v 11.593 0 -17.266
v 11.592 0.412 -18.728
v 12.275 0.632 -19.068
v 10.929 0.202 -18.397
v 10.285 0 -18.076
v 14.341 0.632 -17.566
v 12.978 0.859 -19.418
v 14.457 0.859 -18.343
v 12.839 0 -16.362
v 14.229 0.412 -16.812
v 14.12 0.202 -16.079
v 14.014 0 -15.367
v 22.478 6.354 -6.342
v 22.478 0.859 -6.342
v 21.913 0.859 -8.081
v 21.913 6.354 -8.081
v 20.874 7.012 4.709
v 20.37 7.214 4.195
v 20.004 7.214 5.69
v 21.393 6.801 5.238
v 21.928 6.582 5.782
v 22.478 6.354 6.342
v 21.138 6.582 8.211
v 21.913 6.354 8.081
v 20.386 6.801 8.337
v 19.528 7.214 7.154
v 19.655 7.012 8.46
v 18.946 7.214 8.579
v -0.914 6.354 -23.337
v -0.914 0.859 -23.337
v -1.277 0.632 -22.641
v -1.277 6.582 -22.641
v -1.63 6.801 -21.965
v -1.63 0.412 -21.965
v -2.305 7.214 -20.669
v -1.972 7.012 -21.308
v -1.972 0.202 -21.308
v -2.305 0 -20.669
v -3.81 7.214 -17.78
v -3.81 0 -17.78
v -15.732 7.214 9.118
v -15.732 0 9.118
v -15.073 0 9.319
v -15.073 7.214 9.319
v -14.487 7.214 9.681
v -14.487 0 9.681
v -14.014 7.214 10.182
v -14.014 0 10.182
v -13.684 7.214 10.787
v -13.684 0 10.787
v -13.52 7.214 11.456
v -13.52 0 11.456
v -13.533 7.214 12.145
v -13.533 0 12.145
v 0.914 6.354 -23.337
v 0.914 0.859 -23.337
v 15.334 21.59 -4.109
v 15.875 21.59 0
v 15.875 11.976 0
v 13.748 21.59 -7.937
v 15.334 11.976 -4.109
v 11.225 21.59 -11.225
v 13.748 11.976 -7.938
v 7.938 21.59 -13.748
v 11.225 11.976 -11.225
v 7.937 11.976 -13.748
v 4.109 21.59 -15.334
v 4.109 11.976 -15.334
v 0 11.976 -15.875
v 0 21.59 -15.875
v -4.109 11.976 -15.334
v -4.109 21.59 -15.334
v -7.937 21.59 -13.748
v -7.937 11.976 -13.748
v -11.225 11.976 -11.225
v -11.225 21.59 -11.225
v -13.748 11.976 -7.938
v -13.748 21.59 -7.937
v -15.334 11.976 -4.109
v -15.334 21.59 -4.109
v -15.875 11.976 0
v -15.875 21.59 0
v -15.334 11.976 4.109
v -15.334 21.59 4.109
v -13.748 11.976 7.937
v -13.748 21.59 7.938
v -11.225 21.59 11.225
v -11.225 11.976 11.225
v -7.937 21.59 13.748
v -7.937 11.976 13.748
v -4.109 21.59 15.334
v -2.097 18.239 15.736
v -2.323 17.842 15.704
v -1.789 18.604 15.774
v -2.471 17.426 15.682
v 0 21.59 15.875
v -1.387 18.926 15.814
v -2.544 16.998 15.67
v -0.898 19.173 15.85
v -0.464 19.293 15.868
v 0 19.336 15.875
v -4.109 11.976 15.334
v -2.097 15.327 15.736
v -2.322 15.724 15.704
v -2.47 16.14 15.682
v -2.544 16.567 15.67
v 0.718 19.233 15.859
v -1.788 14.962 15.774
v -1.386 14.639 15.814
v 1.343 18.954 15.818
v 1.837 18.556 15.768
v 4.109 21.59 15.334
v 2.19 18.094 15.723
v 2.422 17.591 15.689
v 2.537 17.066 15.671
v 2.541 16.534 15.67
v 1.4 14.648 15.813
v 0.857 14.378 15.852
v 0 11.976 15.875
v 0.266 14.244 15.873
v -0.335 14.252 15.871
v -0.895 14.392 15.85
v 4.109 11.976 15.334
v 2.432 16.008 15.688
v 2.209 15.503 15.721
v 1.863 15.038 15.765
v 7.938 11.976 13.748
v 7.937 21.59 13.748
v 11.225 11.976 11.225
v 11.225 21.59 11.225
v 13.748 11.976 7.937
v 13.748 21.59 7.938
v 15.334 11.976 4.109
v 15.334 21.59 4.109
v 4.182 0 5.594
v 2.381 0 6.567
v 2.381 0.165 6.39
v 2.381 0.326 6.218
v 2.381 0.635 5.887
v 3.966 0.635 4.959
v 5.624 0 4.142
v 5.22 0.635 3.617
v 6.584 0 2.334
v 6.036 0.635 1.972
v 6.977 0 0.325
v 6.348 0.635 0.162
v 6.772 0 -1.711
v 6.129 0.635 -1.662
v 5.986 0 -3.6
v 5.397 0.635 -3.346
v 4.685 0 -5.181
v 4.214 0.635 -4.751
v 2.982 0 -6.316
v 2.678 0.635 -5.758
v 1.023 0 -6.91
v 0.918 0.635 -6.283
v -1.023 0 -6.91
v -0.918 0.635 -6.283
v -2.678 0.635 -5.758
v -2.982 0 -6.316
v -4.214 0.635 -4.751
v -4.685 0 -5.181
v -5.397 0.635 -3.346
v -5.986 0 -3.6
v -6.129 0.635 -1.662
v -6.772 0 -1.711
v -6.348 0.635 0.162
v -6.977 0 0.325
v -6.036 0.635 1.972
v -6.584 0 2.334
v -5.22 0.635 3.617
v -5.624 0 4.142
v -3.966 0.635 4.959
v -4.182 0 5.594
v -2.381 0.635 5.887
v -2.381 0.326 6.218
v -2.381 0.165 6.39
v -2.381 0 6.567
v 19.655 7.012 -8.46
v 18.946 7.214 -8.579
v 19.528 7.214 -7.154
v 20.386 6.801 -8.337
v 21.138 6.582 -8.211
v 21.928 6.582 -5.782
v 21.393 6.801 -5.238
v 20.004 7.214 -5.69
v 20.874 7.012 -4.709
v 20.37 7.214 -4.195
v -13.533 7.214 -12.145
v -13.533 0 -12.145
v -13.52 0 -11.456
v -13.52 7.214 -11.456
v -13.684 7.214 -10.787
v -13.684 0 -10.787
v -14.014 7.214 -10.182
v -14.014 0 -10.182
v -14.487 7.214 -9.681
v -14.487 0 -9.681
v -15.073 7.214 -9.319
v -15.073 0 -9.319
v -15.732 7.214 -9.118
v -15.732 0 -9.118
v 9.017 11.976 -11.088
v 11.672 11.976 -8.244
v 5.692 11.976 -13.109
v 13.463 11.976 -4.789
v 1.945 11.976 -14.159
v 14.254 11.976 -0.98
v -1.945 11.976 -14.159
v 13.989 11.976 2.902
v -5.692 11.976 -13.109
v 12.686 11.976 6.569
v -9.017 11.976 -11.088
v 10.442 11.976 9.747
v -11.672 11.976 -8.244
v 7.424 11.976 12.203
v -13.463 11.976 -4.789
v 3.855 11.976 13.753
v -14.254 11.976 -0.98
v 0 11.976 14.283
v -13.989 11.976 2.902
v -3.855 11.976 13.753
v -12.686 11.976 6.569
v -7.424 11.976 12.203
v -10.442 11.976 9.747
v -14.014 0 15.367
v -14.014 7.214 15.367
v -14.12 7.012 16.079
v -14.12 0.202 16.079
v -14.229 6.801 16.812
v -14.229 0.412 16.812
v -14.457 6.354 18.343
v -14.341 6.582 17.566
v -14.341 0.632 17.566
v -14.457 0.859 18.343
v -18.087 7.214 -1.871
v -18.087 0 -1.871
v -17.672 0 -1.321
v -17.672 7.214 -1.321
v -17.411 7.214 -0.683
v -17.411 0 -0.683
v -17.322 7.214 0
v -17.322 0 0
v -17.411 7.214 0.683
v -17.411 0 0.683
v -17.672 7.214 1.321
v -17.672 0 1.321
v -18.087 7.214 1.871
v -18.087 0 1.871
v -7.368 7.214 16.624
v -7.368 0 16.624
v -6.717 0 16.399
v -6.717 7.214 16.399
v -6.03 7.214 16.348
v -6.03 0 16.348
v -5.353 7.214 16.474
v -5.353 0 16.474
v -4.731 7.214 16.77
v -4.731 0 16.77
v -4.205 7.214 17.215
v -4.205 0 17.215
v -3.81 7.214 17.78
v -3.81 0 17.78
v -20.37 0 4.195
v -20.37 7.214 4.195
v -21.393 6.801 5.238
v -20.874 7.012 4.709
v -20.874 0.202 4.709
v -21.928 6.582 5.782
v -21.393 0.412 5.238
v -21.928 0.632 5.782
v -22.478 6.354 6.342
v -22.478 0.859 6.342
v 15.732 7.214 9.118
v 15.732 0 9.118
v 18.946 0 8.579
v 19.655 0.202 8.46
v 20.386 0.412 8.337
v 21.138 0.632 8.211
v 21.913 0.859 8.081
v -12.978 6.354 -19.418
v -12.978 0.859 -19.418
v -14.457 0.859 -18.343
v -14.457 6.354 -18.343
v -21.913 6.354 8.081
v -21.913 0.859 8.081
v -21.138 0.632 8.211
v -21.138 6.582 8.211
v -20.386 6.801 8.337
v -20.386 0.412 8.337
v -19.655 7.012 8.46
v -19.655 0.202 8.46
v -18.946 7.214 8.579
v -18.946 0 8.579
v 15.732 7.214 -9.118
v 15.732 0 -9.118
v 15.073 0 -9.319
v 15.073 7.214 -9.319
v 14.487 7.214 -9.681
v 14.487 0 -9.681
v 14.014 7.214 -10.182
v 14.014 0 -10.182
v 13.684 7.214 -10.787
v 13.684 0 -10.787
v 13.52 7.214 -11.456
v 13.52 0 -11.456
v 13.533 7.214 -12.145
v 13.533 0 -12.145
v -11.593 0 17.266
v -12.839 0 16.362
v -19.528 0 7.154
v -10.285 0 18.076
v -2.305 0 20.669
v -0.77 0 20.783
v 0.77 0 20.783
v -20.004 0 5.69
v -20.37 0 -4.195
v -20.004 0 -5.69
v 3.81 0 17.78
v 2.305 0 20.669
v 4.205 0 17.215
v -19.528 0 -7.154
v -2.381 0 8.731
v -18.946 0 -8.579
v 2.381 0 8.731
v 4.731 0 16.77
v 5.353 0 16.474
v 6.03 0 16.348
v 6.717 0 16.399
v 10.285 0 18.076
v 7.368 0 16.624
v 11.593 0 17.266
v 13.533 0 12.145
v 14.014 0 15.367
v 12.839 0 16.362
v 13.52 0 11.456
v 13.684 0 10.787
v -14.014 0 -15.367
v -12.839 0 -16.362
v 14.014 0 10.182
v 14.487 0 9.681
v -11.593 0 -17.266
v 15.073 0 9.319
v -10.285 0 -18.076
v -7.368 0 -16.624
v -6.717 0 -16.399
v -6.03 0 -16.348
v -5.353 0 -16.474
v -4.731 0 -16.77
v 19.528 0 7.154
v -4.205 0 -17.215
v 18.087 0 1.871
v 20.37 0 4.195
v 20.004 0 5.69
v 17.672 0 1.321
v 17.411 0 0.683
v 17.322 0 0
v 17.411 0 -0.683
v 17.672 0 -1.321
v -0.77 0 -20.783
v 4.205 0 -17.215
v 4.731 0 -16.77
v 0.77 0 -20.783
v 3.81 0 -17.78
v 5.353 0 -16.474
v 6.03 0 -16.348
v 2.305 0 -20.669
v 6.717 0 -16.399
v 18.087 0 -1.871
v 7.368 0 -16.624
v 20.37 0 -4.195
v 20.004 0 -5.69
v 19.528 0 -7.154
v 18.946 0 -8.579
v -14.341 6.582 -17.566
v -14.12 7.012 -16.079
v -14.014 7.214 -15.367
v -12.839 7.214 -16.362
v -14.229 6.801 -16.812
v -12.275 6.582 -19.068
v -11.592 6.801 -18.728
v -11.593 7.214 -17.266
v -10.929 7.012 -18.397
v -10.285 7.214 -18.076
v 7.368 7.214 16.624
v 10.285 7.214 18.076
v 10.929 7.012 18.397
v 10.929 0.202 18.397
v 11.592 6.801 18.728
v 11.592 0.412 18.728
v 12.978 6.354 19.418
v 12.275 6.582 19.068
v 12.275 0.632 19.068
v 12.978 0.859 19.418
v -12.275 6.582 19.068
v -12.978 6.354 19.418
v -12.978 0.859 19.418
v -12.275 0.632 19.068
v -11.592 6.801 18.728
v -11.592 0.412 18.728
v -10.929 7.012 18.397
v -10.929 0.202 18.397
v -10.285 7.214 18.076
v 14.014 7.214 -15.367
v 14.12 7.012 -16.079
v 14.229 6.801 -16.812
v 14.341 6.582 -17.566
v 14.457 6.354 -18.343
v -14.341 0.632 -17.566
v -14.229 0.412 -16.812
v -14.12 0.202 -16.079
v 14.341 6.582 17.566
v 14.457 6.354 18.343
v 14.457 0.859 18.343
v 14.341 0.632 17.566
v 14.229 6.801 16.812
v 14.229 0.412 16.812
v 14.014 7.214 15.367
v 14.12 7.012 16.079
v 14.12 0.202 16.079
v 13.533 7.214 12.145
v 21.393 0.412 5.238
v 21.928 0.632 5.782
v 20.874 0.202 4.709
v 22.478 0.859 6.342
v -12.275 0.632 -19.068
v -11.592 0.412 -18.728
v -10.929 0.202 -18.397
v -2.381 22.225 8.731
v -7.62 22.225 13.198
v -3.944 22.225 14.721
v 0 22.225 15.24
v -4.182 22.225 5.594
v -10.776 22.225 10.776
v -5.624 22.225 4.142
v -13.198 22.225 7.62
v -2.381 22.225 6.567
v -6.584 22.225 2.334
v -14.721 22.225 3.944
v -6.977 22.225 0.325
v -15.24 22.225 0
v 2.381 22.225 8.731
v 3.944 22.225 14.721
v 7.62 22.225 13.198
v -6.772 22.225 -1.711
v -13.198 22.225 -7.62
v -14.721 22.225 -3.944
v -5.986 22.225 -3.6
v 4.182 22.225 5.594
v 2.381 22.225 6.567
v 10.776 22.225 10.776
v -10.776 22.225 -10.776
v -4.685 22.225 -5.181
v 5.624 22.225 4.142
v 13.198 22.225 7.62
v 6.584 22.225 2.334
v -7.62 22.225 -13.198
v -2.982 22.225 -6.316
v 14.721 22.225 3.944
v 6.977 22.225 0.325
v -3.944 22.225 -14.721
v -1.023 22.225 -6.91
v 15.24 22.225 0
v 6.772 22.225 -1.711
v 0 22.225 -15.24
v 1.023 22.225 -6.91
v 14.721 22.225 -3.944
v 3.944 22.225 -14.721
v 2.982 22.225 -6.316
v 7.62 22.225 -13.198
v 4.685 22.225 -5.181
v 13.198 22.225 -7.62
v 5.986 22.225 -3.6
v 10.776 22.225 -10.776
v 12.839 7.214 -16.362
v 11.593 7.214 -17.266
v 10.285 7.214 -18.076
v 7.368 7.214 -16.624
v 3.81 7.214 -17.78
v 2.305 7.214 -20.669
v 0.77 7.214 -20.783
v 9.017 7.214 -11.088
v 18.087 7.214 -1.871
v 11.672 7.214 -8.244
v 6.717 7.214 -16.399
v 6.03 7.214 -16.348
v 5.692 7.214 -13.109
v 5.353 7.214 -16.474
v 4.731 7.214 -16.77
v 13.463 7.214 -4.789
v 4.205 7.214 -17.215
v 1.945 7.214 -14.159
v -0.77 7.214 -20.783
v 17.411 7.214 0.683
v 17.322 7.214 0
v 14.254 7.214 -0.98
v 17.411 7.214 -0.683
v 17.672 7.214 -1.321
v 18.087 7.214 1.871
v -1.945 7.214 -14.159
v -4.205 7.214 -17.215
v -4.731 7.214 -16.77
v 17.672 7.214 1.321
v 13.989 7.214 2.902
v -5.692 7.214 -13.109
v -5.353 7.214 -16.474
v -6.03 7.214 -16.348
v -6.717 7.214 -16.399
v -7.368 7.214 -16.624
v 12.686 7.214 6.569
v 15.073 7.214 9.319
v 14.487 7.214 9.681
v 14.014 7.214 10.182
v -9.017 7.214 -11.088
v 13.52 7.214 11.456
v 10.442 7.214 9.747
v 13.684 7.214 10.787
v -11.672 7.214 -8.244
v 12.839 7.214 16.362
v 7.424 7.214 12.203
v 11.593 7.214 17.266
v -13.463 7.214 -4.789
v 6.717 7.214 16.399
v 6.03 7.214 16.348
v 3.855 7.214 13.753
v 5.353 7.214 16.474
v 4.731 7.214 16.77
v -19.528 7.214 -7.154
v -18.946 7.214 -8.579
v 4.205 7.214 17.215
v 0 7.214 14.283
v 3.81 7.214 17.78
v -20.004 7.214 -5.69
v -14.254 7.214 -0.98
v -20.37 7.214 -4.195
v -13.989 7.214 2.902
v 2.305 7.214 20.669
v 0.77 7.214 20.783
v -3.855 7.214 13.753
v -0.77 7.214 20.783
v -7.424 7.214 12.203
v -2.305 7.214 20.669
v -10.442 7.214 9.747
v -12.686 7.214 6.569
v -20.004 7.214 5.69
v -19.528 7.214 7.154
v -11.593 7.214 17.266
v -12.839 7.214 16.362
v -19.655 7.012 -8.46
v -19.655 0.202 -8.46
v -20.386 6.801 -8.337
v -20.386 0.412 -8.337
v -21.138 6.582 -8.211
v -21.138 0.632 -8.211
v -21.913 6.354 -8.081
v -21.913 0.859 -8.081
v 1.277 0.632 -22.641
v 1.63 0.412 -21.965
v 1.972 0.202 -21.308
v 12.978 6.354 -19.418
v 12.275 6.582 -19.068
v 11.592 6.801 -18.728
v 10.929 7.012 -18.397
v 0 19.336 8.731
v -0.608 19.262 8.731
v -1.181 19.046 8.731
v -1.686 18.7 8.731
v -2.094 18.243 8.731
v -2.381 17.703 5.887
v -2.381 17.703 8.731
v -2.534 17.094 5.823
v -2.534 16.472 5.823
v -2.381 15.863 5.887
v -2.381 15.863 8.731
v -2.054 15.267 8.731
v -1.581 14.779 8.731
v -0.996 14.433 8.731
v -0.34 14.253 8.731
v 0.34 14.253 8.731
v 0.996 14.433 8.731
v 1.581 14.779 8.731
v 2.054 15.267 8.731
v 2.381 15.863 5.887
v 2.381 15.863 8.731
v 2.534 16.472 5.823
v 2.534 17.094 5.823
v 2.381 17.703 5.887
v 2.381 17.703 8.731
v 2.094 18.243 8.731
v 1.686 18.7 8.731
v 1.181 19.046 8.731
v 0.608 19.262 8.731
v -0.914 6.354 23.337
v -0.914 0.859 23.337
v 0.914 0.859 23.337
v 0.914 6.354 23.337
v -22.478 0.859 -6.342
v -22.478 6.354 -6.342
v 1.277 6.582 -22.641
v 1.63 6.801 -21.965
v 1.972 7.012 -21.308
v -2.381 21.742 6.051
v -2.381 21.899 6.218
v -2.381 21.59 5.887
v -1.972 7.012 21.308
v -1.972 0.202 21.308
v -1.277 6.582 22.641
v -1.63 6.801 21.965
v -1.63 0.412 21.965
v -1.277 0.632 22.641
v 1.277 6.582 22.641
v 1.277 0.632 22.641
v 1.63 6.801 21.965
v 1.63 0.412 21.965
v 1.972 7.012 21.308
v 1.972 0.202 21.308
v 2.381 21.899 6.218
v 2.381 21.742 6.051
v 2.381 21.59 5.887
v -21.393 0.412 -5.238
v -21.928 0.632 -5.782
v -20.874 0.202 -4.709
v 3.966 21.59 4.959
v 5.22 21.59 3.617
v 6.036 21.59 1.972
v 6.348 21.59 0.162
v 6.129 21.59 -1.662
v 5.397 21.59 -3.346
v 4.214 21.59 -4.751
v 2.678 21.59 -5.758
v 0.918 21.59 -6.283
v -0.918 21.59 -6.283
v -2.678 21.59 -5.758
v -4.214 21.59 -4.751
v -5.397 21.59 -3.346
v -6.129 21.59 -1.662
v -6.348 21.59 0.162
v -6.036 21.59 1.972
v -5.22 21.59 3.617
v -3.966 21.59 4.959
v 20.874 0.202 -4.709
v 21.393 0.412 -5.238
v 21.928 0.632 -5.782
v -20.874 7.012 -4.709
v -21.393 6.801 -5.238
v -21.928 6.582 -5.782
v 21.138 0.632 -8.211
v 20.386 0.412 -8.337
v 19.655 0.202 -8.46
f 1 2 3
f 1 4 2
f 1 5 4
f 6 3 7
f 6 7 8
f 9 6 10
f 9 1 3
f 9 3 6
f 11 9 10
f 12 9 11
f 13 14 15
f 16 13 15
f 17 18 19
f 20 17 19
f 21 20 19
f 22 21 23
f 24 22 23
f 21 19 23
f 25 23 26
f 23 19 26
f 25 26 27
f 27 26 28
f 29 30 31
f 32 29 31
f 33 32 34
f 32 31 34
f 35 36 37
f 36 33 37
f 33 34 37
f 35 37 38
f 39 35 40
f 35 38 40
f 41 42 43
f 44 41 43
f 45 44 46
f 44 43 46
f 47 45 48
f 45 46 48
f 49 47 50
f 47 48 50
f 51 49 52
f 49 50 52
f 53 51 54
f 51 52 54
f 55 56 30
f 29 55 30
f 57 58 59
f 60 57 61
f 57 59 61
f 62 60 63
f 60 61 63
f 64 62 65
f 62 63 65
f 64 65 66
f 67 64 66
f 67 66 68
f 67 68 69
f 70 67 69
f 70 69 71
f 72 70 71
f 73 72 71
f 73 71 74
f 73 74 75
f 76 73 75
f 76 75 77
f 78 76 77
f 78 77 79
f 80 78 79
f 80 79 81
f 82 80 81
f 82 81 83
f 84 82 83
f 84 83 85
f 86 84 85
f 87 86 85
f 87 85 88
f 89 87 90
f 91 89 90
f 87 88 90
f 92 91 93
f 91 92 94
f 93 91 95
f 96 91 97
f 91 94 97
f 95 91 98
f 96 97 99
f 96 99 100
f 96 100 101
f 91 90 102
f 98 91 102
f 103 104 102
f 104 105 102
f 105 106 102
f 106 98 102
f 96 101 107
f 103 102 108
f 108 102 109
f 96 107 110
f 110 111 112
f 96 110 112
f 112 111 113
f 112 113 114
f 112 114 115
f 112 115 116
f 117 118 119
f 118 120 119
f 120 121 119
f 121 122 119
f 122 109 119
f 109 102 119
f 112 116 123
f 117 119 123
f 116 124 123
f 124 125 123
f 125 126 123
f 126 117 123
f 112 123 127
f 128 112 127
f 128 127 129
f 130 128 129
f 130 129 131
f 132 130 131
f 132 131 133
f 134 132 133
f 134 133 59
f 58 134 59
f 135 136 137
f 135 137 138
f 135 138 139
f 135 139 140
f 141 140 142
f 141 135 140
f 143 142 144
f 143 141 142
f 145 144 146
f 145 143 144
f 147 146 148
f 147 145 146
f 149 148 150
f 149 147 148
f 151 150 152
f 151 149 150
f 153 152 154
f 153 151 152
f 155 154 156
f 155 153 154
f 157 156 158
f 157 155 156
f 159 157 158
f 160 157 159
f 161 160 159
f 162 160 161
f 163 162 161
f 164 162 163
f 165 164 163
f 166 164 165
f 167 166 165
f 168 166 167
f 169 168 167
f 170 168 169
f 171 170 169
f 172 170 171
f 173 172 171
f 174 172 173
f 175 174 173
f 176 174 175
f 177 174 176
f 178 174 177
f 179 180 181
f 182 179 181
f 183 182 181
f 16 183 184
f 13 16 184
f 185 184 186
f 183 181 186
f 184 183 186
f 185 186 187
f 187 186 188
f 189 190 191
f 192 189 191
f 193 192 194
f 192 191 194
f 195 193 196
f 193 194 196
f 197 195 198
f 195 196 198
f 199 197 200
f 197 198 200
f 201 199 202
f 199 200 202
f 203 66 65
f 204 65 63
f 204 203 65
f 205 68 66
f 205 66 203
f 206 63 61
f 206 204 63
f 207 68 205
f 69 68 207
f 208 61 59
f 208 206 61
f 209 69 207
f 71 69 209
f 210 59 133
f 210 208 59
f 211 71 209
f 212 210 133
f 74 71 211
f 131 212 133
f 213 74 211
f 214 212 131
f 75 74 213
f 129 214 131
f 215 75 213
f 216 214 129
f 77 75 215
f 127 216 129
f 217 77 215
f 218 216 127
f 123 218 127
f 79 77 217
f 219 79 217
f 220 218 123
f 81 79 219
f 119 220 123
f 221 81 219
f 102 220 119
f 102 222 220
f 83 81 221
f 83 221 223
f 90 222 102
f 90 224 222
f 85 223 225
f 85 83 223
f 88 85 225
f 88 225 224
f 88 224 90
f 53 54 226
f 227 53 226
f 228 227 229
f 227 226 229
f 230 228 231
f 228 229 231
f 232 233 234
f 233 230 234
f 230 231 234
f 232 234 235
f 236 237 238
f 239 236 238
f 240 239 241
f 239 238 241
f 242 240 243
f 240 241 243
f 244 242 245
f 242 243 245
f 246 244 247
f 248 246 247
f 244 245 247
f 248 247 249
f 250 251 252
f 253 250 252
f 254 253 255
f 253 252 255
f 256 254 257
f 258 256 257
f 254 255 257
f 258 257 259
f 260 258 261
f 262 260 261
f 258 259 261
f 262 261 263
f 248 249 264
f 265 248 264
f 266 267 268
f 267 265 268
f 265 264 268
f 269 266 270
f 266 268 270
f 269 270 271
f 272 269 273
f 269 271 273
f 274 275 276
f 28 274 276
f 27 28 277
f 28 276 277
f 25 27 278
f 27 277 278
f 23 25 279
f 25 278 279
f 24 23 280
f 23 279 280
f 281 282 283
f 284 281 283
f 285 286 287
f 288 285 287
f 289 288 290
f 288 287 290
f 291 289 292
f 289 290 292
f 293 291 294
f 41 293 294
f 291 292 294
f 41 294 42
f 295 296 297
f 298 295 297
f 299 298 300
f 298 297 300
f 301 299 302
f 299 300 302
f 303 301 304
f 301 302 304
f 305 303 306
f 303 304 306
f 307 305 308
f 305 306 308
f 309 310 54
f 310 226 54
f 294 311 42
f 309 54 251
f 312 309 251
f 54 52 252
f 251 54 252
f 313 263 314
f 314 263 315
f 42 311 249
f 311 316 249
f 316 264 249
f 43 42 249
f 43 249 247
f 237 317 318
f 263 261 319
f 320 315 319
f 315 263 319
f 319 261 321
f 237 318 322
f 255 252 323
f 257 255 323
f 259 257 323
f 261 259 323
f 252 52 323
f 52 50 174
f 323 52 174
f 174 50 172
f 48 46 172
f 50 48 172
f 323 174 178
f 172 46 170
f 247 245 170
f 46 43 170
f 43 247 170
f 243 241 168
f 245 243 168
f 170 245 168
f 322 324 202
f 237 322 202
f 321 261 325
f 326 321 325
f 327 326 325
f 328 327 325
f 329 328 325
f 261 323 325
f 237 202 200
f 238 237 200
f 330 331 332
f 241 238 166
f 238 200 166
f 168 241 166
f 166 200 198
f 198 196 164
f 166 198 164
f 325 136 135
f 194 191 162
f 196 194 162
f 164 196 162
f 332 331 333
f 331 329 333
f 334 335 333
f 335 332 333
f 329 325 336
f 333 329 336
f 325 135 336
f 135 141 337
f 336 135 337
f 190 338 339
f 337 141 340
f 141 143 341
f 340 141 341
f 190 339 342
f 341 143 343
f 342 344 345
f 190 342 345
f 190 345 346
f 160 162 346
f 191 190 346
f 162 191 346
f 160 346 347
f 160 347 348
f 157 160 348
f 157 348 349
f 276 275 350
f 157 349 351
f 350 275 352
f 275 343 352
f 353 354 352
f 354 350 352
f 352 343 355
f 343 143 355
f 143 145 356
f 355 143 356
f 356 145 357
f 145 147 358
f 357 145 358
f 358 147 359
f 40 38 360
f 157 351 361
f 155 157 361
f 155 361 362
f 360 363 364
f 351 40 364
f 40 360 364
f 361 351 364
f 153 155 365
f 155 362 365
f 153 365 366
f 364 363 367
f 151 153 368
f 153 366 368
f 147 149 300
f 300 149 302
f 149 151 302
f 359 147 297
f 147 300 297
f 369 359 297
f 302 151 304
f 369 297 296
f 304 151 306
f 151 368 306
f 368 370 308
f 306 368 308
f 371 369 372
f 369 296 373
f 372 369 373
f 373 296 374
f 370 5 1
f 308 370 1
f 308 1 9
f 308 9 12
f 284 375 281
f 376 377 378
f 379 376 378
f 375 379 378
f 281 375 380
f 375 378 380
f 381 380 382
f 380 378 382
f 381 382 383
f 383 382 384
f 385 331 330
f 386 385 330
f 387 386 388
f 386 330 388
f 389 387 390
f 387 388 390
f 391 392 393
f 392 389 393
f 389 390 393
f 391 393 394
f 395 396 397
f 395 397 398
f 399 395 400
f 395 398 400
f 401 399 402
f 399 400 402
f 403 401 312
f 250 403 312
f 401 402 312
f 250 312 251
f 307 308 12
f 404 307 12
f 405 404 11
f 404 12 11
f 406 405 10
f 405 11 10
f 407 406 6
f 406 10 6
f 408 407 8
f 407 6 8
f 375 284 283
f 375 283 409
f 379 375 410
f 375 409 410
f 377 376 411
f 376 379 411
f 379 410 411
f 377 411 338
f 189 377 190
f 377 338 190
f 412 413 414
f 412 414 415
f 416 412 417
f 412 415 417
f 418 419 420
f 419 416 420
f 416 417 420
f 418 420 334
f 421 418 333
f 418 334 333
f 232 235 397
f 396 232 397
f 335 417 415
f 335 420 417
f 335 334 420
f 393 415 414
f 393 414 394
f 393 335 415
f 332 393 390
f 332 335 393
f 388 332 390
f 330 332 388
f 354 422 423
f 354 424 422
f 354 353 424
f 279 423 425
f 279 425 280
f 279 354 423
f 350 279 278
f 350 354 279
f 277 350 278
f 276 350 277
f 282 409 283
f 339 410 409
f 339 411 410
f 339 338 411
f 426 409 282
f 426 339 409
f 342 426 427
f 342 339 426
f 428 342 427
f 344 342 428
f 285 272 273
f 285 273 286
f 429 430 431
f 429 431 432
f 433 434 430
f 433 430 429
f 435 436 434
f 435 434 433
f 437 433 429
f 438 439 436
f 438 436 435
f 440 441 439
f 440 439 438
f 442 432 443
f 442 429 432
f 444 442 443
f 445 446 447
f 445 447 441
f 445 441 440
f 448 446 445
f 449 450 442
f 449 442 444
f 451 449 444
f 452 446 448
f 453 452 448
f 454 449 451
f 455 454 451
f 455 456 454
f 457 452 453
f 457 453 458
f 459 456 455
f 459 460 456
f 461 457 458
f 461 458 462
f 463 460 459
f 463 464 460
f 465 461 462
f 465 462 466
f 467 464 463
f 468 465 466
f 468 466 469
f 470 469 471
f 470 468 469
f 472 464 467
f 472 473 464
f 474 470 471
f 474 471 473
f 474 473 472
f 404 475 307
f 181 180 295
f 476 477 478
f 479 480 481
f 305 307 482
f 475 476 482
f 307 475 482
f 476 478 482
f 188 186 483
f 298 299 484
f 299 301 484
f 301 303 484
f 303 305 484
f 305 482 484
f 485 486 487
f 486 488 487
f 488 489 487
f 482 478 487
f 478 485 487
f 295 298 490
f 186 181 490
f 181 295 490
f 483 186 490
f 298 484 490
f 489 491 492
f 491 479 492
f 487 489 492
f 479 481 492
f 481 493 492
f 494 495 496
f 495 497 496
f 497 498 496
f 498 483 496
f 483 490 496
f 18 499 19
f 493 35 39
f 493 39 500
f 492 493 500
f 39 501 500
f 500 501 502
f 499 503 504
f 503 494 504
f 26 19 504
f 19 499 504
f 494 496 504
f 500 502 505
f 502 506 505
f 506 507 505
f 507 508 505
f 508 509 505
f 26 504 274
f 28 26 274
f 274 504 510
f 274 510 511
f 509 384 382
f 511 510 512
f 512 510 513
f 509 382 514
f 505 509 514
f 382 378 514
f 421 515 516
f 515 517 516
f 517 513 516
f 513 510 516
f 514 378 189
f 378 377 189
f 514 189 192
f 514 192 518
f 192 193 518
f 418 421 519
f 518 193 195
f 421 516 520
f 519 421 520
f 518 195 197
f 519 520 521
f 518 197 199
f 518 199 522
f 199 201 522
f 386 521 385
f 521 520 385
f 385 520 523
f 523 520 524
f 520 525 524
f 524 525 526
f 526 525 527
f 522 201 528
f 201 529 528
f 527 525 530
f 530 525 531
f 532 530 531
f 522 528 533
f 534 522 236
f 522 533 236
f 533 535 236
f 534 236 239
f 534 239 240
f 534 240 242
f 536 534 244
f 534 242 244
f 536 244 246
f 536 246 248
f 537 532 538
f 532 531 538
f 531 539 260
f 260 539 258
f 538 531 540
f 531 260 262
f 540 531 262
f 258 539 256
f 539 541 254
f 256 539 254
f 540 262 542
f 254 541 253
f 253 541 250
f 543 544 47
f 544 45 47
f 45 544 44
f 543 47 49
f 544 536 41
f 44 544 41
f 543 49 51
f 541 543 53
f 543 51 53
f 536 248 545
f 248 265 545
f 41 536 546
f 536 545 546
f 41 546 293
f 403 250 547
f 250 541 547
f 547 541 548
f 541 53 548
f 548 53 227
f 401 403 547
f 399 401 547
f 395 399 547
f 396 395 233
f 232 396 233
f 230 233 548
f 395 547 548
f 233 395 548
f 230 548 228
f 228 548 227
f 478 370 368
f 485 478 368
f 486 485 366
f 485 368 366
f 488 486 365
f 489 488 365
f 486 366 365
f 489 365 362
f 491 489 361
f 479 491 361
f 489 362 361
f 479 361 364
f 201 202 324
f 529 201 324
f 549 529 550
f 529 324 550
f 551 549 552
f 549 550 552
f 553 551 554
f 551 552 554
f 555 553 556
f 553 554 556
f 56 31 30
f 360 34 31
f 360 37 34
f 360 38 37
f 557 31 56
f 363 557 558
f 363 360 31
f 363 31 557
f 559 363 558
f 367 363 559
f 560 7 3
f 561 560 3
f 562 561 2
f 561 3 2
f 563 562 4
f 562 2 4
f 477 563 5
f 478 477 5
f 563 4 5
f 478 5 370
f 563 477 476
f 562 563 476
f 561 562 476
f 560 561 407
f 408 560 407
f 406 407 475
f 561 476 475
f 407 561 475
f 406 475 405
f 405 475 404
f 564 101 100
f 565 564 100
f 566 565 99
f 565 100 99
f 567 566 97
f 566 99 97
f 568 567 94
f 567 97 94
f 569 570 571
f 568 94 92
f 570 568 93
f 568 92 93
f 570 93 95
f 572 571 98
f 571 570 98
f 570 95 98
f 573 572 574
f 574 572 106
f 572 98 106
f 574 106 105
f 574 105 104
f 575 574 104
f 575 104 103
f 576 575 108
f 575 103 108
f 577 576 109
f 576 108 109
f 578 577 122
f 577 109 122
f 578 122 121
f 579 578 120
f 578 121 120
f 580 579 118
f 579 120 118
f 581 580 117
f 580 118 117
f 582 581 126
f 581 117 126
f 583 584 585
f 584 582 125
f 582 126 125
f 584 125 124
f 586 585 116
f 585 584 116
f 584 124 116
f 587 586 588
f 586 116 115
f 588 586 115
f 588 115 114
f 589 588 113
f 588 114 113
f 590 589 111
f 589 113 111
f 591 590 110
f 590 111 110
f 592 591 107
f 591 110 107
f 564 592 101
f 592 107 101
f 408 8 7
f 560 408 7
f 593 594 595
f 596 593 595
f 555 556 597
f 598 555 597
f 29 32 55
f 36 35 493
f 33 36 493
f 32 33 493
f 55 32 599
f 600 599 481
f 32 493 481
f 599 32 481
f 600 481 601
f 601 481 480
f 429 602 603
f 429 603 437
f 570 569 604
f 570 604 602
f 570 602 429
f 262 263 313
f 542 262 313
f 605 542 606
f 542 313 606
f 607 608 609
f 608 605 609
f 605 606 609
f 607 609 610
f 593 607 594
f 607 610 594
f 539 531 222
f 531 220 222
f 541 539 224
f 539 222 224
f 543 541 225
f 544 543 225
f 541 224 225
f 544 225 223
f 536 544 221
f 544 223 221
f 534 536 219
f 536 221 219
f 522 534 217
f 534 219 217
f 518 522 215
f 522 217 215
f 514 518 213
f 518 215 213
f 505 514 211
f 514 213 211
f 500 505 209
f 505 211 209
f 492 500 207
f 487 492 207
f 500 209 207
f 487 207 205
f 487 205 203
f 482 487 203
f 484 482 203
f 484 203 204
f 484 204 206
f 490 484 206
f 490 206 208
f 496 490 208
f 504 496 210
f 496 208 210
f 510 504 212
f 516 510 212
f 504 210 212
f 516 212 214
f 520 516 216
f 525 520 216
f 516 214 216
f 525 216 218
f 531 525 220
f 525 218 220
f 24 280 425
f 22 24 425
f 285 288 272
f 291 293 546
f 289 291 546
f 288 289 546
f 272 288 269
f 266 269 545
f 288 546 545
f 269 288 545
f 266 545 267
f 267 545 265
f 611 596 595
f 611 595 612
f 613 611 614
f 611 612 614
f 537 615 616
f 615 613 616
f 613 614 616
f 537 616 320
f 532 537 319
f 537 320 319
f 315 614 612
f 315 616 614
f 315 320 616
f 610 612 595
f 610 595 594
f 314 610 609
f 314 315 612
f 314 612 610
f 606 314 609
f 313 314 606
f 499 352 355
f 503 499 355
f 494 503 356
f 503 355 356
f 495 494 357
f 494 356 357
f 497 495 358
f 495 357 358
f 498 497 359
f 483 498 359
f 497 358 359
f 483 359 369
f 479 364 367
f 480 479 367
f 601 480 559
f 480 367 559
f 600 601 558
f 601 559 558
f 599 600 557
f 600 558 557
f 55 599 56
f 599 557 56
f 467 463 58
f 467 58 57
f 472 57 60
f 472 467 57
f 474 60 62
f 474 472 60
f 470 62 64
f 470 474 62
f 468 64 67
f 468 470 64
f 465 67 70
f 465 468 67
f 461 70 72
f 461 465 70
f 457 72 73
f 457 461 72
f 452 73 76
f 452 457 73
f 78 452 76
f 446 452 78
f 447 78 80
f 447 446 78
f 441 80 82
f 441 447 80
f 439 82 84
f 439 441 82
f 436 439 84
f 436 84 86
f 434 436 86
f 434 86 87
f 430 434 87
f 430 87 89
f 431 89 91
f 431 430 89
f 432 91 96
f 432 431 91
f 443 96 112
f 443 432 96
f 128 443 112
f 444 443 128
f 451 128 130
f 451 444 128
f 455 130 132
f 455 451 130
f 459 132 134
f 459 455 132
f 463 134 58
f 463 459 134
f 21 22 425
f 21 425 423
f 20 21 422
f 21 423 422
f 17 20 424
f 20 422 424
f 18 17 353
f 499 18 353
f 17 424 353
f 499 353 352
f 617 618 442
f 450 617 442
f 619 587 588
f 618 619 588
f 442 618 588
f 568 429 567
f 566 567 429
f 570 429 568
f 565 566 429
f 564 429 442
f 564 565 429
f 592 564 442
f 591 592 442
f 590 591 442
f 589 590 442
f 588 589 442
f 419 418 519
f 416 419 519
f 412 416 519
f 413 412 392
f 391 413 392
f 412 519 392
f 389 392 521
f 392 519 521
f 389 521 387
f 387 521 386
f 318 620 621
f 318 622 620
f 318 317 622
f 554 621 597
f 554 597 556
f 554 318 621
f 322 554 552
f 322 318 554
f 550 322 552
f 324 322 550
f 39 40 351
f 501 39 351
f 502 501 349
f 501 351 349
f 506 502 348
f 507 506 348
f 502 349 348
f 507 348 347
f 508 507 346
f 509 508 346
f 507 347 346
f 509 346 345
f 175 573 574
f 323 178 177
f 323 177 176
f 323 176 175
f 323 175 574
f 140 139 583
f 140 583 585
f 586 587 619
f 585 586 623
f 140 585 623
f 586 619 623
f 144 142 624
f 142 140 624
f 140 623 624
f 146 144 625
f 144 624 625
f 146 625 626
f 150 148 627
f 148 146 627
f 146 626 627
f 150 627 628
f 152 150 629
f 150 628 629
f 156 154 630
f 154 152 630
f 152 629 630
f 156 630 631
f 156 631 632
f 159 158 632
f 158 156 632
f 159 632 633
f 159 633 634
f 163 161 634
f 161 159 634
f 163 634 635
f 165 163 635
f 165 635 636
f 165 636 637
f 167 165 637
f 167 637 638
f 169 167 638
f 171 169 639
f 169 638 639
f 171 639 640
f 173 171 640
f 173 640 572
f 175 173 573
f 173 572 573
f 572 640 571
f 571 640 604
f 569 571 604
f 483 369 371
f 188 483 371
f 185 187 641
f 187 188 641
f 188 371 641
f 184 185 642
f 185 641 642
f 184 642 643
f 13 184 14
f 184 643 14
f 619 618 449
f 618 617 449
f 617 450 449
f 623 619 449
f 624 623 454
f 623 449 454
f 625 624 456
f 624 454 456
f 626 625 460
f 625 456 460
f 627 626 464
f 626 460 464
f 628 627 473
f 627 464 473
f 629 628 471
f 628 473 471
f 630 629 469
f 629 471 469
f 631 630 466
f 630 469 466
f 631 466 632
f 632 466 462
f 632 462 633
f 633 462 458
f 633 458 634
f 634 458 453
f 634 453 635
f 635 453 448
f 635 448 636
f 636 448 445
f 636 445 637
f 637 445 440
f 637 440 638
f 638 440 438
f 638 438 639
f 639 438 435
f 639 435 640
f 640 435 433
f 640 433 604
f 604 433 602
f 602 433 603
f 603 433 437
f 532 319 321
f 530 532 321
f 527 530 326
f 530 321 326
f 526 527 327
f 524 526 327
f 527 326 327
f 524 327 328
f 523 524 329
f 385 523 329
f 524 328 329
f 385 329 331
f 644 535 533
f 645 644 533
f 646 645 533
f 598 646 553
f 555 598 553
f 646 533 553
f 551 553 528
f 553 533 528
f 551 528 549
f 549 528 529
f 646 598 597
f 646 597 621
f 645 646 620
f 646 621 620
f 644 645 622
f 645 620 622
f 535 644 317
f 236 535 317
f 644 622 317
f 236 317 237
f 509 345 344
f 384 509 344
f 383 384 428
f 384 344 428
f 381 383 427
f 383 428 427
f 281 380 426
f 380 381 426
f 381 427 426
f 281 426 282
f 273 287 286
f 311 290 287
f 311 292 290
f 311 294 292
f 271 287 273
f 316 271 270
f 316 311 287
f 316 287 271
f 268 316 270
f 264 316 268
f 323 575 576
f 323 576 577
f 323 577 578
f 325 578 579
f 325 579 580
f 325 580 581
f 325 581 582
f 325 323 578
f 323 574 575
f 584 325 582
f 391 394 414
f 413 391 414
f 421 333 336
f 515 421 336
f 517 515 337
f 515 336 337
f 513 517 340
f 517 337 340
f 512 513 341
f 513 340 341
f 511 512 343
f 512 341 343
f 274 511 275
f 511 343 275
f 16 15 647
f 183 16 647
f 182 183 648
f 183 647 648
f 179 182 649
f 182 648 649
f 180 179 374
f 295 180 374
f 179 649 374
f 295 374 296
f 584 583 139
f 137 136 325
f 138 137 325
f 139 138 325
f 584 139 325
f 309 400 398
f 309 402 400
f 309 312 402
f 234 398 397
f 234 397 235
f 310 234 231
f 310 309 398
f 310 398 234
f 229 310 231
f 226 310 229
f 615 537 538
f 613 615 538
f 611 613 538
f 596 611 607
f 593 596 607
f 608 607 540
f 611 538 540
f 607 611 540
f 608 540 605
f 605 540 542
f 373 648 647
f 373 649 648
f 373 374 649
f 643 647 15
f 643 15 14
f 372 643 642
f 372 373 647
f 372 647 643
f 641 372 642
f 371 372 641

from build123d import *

# Parameters (mm, degrees)
SALIENTE_EXTRUIR1_DEPTH = 7.2136
CROQUIS2_R              = 15.875
SALIENTE_EXTRUIR2_DEPTH = 15.0114
CROQUIS5_R              = 6.35
CORTAR_EXTRUIR2_DEPTH   = 23.2250001
CHAFL_N2_SIZE           = 0.635
REDONDEO1_R             = 0.635
CROQUIS8_W              = 3.175
CROQUIS8_H              = 4.7625
CROQUIS9_W              = 2.5527
CROQUIS9_H              = 15.875
CHAFL_N3_SIZE           = 0.635
CROQUIS11_W             = 4.7625
CROQUIS11_H             = 4.7625
CORTAR_EXTRUIR3_DEPTH   = 23.225


with BuildPart() as part:
    # Croquis1 → Saliente-Extruir1 (new body)
    with BuildSketch(Plane(origin=(0, 0, 0), x_dir=(1, 0, 0), z_dir=(0, 1, 0))):
        with BuildLine():
            Line((12.977610276, 19.417818353), (7.368467037, 16.623783971))
            ThreePointArc((7.368467037, 16.623783971), (5.352847667, 16.474371141), (3.81, 17.78))
            Line((3.81, 17.78), (0.9144, 23.337392972))
            ThreePointArc((0.9144, 23.337392972), (0, 23.3553), (-0.9144, 23.337392972))
            Line((-0.9144, 23.337392972), (-3.81, 17.78))
            ThreePointArc((-3.81, 17.78), (-5.352847667, 16.474371141), (-7.368467037, 16.623783971))
            Line((-7.368467037, 16.623783971), (-12.977610276, 19.417818353))
            ThreePointArc((-12.977610276, 19.417818353), (-13.727900903, 18.894834609), (-14.457140556, 18.342876684))
            Line((-14.457140556, 18.342876684), (-13.533176534, 12.144860349))
            ThreePointArc((-13.533176534, 12.144860349), (-14.013937128, 10.181721309), (-15.732430111, 9.117847487))
            Line((-15.732430111, 9.117847487), (-21.91261452, 8.081297111))
            ThreePointArc((-21.91261452, 8.081297111), (-22.212210255, 7.217184609), (-22.477744799, 6.342004954))
            Line((-22.477744799, 6.342004954), (-18.087139608, 1.870796833))
            ThreePointArc((-18.087139608, 1.870796833), (-17.322178923, 0), (-18.087139608, -1.870796833))
            Line((-18.087139608, -1.870796833), (-22.477744799, -6.342004954))
            ThreePointArc((-22.477744799, -6.342004954), (-22.212210255, -7.217184609), (-21.91261452, -8.081297111))
            Line((-21.91261452, -8.081297111), (-15.732430111, -9.117847487))
            ThreePointArc((-15.732430111, -9.117847487), (-14.013937128, -10.181721309), (-13.533176534, -12.144860349))
            Line((-13.533176534, -12.144860349), (-14.457140556, -18.342876684))
            ThreePointArc((-14.457140556, -18.342876684), (-13.727900903, -18.894834609), (-12.977610276, -19.417818353))
            Line((-12.977610276, -19.417818353), (-7.368467037, -16.623783971))
            ThreePointArc((-7.368467037, -16.623783971), (-5.352847667, -16.474371141), (-3.81, -17.78))
            Line((-3.81, -17.78), (-0.9144, -23.337392972))
            ThreePointArc((-0.9144, -23.337392972), (0, -23.3553), (0.9144, -23.337392972))
            Line((0.9144, -23.337392972), (3.81, -17.78))
            ThreePointArc((3.81, -17.78), (5.352847667, -16.474371141), (7.368467037, -16.623783971))
            Line((7.368467037, -16.623783971), (12.977610276, -19.417818353))
            ThreePointArc((12.977610276, -19.417818353), (13.727900903, -18.894834609), (14.457140556, -18.342876684))
            Line((14.457140556, -18.342876684), (13.533176534, -12.144860349))
            ThreePointArc((13.533176534, -12.144860349), (14.013937128, -10.181721309), (15.732430111, -9.117847487))
            Line((15.732430111, -9.117847487), (21.91261452, -8.081297111))
            ThreePointArc((21.91261452, -8.081297111), (22.212210255, -7.217184609), (22.477744799, -6.342004954))
            Line((22.477744799, -6.342004954), (18.087139608, -1.870796833))
            ThreePointArc((18.087139608, -1.870796833), (17.322178923, 0), (18.087139608, 1.870796833))
            Line((18.087139608, 1.870796833), (22.477744799, 6.342004954))
            ThreePointArc((22.477744799, 6.342004954), (22.212210255, 7.217184609), (21.91261452, 8.081297111))
            Line((21.91261452, 8.081297111), (15.732430111, 9.117847487))
            ThreePointArc((15.732430111, 9.117847487), (14.013937128, 10.181721309), (13.533176534, 12.144860349))
            Line((13.533176534, 12.144860349), (14.457140556, 18.342876684))
            ThreePointArc((14.457140556, 18.342876684), (13.727900903, 18.894834609), (12.977610276, 19.417818353))
        make_face()
    extrude(amount=SALIENTE_EXTRUIR1_DEPTH)

    # Croquis2 → Saliente-Extruir2 (add)
    with BuildSketch(Plane(origin=(0, 7.2136, 0), x_dir=(1, 0, 0), z_dir=(0, 1, 0))):
        Circle(CROQUIS2_R)
    extrude(amount=SALIENTE_EXTRUIR2_DEPTH)

    # Croquis3 → Cortar-Revolución3 (revolve, cut)
    with BuildSketch(Plane(origin=(0, 0, 0), x_dir=(0, 0, -1), z_dir=(1, 0, 0))):
        Polygon((23.972392972, 7.2136), (23.972392972, 6.1468), (20.797392972, 7.2136), align=None)
    cortar_revoluci_n3 = revolve(axis=Axis((0, 0, 0), (0, -1, 0)), mode=Mode.SUBTRACT)

    # Simetría1: Cortar-Revolución3 across plane
    add(cortar_revoluci_n3.mirror(Plane.ZX.offset(3.6068)), mode=Mode.SUBTRACT)

    # Croquis5 → Cortar-Extruir2 (cut, through all)
    with BuildSketch(Plane(origin=(0, 22.225, 0), x_dir=(1, 0, 0), z_dir=(0, 1, 0))):
        Circle(CROQUIS5_R)
    extrude(amount=-CORTAR_EXTRUIR2_DEPTH, mode=Mode.SUBTRACT)

    # Chaflán2
    chafl_n2_edges = [part.edges().sort_by_distance(p)[0] for p in [
        (-15.875, 22.225, 0),
    ]]
    chamfer(chafl_n2_edges, length=CHAFL_N2_SIZE)

    # Redondeo1
    redondeo1_edges = [part.edges().sort_by_distance(p)[0] for p in [
        (-15.875, 7.2136, 0),
    ]]
    fillet(redondeo1_edges, radius=REDONDEO1_R)

    # Croquis8 → Cortar-Revolución4 (revolve, cut)
    with BuildSketch(Plane(origin=(0, 0, 0), x_dir=(0, 0, -1), z_dir=(1, 0, 0))):
        with Locations((-15.870465895, 9.59485)):
            Rectangle(CROQUIS8_W, CROQUIS8_H)
    revolve(axis=Axis((0, 0, -0.004534105), (0, -1, 0)), mode=Mode.SUBTRACT)

    # Croquis9 → Taladro roscado 1/4-201 (revolve, cut)
    with BuildSketch(Plane(origin=(0, 16.78305, 0), x_dir=(0, 1, 0), z_dir=(1, 0, 0))):
        with Locations((1.27635, 7.9375)):
            Rectangle(CROQUIS9_W, CROQUIS9_H)
    revolve(axis=Axis((0, 16.78305, -6.35), (0, 0, 1)), mode=Mode.SUBTRACT)

    # Chaflán3
    chafl_n3_edges = [part.edges().sort_by_distance(p)[0] for p in [
        (-6.35, 0, 0),
        (-6.35, 22.225, 0),
    ]]
    chamfer(chafl_n3_edges, length=CHAFL_N3_SIZE)

    # Croquis11 → Cortar-Extruir3 (cut, through all)
    with BuildSketch(Plane.XZ):
        with Locations((0, 6.35)):
            Rectangle(CROQUIS11_W, CROQUIS11_H)
    extrude(amount=-CORTAR_EXTRUIR3_DEPTH, mode=Mode.SUBTRACT)


solid = part.part
